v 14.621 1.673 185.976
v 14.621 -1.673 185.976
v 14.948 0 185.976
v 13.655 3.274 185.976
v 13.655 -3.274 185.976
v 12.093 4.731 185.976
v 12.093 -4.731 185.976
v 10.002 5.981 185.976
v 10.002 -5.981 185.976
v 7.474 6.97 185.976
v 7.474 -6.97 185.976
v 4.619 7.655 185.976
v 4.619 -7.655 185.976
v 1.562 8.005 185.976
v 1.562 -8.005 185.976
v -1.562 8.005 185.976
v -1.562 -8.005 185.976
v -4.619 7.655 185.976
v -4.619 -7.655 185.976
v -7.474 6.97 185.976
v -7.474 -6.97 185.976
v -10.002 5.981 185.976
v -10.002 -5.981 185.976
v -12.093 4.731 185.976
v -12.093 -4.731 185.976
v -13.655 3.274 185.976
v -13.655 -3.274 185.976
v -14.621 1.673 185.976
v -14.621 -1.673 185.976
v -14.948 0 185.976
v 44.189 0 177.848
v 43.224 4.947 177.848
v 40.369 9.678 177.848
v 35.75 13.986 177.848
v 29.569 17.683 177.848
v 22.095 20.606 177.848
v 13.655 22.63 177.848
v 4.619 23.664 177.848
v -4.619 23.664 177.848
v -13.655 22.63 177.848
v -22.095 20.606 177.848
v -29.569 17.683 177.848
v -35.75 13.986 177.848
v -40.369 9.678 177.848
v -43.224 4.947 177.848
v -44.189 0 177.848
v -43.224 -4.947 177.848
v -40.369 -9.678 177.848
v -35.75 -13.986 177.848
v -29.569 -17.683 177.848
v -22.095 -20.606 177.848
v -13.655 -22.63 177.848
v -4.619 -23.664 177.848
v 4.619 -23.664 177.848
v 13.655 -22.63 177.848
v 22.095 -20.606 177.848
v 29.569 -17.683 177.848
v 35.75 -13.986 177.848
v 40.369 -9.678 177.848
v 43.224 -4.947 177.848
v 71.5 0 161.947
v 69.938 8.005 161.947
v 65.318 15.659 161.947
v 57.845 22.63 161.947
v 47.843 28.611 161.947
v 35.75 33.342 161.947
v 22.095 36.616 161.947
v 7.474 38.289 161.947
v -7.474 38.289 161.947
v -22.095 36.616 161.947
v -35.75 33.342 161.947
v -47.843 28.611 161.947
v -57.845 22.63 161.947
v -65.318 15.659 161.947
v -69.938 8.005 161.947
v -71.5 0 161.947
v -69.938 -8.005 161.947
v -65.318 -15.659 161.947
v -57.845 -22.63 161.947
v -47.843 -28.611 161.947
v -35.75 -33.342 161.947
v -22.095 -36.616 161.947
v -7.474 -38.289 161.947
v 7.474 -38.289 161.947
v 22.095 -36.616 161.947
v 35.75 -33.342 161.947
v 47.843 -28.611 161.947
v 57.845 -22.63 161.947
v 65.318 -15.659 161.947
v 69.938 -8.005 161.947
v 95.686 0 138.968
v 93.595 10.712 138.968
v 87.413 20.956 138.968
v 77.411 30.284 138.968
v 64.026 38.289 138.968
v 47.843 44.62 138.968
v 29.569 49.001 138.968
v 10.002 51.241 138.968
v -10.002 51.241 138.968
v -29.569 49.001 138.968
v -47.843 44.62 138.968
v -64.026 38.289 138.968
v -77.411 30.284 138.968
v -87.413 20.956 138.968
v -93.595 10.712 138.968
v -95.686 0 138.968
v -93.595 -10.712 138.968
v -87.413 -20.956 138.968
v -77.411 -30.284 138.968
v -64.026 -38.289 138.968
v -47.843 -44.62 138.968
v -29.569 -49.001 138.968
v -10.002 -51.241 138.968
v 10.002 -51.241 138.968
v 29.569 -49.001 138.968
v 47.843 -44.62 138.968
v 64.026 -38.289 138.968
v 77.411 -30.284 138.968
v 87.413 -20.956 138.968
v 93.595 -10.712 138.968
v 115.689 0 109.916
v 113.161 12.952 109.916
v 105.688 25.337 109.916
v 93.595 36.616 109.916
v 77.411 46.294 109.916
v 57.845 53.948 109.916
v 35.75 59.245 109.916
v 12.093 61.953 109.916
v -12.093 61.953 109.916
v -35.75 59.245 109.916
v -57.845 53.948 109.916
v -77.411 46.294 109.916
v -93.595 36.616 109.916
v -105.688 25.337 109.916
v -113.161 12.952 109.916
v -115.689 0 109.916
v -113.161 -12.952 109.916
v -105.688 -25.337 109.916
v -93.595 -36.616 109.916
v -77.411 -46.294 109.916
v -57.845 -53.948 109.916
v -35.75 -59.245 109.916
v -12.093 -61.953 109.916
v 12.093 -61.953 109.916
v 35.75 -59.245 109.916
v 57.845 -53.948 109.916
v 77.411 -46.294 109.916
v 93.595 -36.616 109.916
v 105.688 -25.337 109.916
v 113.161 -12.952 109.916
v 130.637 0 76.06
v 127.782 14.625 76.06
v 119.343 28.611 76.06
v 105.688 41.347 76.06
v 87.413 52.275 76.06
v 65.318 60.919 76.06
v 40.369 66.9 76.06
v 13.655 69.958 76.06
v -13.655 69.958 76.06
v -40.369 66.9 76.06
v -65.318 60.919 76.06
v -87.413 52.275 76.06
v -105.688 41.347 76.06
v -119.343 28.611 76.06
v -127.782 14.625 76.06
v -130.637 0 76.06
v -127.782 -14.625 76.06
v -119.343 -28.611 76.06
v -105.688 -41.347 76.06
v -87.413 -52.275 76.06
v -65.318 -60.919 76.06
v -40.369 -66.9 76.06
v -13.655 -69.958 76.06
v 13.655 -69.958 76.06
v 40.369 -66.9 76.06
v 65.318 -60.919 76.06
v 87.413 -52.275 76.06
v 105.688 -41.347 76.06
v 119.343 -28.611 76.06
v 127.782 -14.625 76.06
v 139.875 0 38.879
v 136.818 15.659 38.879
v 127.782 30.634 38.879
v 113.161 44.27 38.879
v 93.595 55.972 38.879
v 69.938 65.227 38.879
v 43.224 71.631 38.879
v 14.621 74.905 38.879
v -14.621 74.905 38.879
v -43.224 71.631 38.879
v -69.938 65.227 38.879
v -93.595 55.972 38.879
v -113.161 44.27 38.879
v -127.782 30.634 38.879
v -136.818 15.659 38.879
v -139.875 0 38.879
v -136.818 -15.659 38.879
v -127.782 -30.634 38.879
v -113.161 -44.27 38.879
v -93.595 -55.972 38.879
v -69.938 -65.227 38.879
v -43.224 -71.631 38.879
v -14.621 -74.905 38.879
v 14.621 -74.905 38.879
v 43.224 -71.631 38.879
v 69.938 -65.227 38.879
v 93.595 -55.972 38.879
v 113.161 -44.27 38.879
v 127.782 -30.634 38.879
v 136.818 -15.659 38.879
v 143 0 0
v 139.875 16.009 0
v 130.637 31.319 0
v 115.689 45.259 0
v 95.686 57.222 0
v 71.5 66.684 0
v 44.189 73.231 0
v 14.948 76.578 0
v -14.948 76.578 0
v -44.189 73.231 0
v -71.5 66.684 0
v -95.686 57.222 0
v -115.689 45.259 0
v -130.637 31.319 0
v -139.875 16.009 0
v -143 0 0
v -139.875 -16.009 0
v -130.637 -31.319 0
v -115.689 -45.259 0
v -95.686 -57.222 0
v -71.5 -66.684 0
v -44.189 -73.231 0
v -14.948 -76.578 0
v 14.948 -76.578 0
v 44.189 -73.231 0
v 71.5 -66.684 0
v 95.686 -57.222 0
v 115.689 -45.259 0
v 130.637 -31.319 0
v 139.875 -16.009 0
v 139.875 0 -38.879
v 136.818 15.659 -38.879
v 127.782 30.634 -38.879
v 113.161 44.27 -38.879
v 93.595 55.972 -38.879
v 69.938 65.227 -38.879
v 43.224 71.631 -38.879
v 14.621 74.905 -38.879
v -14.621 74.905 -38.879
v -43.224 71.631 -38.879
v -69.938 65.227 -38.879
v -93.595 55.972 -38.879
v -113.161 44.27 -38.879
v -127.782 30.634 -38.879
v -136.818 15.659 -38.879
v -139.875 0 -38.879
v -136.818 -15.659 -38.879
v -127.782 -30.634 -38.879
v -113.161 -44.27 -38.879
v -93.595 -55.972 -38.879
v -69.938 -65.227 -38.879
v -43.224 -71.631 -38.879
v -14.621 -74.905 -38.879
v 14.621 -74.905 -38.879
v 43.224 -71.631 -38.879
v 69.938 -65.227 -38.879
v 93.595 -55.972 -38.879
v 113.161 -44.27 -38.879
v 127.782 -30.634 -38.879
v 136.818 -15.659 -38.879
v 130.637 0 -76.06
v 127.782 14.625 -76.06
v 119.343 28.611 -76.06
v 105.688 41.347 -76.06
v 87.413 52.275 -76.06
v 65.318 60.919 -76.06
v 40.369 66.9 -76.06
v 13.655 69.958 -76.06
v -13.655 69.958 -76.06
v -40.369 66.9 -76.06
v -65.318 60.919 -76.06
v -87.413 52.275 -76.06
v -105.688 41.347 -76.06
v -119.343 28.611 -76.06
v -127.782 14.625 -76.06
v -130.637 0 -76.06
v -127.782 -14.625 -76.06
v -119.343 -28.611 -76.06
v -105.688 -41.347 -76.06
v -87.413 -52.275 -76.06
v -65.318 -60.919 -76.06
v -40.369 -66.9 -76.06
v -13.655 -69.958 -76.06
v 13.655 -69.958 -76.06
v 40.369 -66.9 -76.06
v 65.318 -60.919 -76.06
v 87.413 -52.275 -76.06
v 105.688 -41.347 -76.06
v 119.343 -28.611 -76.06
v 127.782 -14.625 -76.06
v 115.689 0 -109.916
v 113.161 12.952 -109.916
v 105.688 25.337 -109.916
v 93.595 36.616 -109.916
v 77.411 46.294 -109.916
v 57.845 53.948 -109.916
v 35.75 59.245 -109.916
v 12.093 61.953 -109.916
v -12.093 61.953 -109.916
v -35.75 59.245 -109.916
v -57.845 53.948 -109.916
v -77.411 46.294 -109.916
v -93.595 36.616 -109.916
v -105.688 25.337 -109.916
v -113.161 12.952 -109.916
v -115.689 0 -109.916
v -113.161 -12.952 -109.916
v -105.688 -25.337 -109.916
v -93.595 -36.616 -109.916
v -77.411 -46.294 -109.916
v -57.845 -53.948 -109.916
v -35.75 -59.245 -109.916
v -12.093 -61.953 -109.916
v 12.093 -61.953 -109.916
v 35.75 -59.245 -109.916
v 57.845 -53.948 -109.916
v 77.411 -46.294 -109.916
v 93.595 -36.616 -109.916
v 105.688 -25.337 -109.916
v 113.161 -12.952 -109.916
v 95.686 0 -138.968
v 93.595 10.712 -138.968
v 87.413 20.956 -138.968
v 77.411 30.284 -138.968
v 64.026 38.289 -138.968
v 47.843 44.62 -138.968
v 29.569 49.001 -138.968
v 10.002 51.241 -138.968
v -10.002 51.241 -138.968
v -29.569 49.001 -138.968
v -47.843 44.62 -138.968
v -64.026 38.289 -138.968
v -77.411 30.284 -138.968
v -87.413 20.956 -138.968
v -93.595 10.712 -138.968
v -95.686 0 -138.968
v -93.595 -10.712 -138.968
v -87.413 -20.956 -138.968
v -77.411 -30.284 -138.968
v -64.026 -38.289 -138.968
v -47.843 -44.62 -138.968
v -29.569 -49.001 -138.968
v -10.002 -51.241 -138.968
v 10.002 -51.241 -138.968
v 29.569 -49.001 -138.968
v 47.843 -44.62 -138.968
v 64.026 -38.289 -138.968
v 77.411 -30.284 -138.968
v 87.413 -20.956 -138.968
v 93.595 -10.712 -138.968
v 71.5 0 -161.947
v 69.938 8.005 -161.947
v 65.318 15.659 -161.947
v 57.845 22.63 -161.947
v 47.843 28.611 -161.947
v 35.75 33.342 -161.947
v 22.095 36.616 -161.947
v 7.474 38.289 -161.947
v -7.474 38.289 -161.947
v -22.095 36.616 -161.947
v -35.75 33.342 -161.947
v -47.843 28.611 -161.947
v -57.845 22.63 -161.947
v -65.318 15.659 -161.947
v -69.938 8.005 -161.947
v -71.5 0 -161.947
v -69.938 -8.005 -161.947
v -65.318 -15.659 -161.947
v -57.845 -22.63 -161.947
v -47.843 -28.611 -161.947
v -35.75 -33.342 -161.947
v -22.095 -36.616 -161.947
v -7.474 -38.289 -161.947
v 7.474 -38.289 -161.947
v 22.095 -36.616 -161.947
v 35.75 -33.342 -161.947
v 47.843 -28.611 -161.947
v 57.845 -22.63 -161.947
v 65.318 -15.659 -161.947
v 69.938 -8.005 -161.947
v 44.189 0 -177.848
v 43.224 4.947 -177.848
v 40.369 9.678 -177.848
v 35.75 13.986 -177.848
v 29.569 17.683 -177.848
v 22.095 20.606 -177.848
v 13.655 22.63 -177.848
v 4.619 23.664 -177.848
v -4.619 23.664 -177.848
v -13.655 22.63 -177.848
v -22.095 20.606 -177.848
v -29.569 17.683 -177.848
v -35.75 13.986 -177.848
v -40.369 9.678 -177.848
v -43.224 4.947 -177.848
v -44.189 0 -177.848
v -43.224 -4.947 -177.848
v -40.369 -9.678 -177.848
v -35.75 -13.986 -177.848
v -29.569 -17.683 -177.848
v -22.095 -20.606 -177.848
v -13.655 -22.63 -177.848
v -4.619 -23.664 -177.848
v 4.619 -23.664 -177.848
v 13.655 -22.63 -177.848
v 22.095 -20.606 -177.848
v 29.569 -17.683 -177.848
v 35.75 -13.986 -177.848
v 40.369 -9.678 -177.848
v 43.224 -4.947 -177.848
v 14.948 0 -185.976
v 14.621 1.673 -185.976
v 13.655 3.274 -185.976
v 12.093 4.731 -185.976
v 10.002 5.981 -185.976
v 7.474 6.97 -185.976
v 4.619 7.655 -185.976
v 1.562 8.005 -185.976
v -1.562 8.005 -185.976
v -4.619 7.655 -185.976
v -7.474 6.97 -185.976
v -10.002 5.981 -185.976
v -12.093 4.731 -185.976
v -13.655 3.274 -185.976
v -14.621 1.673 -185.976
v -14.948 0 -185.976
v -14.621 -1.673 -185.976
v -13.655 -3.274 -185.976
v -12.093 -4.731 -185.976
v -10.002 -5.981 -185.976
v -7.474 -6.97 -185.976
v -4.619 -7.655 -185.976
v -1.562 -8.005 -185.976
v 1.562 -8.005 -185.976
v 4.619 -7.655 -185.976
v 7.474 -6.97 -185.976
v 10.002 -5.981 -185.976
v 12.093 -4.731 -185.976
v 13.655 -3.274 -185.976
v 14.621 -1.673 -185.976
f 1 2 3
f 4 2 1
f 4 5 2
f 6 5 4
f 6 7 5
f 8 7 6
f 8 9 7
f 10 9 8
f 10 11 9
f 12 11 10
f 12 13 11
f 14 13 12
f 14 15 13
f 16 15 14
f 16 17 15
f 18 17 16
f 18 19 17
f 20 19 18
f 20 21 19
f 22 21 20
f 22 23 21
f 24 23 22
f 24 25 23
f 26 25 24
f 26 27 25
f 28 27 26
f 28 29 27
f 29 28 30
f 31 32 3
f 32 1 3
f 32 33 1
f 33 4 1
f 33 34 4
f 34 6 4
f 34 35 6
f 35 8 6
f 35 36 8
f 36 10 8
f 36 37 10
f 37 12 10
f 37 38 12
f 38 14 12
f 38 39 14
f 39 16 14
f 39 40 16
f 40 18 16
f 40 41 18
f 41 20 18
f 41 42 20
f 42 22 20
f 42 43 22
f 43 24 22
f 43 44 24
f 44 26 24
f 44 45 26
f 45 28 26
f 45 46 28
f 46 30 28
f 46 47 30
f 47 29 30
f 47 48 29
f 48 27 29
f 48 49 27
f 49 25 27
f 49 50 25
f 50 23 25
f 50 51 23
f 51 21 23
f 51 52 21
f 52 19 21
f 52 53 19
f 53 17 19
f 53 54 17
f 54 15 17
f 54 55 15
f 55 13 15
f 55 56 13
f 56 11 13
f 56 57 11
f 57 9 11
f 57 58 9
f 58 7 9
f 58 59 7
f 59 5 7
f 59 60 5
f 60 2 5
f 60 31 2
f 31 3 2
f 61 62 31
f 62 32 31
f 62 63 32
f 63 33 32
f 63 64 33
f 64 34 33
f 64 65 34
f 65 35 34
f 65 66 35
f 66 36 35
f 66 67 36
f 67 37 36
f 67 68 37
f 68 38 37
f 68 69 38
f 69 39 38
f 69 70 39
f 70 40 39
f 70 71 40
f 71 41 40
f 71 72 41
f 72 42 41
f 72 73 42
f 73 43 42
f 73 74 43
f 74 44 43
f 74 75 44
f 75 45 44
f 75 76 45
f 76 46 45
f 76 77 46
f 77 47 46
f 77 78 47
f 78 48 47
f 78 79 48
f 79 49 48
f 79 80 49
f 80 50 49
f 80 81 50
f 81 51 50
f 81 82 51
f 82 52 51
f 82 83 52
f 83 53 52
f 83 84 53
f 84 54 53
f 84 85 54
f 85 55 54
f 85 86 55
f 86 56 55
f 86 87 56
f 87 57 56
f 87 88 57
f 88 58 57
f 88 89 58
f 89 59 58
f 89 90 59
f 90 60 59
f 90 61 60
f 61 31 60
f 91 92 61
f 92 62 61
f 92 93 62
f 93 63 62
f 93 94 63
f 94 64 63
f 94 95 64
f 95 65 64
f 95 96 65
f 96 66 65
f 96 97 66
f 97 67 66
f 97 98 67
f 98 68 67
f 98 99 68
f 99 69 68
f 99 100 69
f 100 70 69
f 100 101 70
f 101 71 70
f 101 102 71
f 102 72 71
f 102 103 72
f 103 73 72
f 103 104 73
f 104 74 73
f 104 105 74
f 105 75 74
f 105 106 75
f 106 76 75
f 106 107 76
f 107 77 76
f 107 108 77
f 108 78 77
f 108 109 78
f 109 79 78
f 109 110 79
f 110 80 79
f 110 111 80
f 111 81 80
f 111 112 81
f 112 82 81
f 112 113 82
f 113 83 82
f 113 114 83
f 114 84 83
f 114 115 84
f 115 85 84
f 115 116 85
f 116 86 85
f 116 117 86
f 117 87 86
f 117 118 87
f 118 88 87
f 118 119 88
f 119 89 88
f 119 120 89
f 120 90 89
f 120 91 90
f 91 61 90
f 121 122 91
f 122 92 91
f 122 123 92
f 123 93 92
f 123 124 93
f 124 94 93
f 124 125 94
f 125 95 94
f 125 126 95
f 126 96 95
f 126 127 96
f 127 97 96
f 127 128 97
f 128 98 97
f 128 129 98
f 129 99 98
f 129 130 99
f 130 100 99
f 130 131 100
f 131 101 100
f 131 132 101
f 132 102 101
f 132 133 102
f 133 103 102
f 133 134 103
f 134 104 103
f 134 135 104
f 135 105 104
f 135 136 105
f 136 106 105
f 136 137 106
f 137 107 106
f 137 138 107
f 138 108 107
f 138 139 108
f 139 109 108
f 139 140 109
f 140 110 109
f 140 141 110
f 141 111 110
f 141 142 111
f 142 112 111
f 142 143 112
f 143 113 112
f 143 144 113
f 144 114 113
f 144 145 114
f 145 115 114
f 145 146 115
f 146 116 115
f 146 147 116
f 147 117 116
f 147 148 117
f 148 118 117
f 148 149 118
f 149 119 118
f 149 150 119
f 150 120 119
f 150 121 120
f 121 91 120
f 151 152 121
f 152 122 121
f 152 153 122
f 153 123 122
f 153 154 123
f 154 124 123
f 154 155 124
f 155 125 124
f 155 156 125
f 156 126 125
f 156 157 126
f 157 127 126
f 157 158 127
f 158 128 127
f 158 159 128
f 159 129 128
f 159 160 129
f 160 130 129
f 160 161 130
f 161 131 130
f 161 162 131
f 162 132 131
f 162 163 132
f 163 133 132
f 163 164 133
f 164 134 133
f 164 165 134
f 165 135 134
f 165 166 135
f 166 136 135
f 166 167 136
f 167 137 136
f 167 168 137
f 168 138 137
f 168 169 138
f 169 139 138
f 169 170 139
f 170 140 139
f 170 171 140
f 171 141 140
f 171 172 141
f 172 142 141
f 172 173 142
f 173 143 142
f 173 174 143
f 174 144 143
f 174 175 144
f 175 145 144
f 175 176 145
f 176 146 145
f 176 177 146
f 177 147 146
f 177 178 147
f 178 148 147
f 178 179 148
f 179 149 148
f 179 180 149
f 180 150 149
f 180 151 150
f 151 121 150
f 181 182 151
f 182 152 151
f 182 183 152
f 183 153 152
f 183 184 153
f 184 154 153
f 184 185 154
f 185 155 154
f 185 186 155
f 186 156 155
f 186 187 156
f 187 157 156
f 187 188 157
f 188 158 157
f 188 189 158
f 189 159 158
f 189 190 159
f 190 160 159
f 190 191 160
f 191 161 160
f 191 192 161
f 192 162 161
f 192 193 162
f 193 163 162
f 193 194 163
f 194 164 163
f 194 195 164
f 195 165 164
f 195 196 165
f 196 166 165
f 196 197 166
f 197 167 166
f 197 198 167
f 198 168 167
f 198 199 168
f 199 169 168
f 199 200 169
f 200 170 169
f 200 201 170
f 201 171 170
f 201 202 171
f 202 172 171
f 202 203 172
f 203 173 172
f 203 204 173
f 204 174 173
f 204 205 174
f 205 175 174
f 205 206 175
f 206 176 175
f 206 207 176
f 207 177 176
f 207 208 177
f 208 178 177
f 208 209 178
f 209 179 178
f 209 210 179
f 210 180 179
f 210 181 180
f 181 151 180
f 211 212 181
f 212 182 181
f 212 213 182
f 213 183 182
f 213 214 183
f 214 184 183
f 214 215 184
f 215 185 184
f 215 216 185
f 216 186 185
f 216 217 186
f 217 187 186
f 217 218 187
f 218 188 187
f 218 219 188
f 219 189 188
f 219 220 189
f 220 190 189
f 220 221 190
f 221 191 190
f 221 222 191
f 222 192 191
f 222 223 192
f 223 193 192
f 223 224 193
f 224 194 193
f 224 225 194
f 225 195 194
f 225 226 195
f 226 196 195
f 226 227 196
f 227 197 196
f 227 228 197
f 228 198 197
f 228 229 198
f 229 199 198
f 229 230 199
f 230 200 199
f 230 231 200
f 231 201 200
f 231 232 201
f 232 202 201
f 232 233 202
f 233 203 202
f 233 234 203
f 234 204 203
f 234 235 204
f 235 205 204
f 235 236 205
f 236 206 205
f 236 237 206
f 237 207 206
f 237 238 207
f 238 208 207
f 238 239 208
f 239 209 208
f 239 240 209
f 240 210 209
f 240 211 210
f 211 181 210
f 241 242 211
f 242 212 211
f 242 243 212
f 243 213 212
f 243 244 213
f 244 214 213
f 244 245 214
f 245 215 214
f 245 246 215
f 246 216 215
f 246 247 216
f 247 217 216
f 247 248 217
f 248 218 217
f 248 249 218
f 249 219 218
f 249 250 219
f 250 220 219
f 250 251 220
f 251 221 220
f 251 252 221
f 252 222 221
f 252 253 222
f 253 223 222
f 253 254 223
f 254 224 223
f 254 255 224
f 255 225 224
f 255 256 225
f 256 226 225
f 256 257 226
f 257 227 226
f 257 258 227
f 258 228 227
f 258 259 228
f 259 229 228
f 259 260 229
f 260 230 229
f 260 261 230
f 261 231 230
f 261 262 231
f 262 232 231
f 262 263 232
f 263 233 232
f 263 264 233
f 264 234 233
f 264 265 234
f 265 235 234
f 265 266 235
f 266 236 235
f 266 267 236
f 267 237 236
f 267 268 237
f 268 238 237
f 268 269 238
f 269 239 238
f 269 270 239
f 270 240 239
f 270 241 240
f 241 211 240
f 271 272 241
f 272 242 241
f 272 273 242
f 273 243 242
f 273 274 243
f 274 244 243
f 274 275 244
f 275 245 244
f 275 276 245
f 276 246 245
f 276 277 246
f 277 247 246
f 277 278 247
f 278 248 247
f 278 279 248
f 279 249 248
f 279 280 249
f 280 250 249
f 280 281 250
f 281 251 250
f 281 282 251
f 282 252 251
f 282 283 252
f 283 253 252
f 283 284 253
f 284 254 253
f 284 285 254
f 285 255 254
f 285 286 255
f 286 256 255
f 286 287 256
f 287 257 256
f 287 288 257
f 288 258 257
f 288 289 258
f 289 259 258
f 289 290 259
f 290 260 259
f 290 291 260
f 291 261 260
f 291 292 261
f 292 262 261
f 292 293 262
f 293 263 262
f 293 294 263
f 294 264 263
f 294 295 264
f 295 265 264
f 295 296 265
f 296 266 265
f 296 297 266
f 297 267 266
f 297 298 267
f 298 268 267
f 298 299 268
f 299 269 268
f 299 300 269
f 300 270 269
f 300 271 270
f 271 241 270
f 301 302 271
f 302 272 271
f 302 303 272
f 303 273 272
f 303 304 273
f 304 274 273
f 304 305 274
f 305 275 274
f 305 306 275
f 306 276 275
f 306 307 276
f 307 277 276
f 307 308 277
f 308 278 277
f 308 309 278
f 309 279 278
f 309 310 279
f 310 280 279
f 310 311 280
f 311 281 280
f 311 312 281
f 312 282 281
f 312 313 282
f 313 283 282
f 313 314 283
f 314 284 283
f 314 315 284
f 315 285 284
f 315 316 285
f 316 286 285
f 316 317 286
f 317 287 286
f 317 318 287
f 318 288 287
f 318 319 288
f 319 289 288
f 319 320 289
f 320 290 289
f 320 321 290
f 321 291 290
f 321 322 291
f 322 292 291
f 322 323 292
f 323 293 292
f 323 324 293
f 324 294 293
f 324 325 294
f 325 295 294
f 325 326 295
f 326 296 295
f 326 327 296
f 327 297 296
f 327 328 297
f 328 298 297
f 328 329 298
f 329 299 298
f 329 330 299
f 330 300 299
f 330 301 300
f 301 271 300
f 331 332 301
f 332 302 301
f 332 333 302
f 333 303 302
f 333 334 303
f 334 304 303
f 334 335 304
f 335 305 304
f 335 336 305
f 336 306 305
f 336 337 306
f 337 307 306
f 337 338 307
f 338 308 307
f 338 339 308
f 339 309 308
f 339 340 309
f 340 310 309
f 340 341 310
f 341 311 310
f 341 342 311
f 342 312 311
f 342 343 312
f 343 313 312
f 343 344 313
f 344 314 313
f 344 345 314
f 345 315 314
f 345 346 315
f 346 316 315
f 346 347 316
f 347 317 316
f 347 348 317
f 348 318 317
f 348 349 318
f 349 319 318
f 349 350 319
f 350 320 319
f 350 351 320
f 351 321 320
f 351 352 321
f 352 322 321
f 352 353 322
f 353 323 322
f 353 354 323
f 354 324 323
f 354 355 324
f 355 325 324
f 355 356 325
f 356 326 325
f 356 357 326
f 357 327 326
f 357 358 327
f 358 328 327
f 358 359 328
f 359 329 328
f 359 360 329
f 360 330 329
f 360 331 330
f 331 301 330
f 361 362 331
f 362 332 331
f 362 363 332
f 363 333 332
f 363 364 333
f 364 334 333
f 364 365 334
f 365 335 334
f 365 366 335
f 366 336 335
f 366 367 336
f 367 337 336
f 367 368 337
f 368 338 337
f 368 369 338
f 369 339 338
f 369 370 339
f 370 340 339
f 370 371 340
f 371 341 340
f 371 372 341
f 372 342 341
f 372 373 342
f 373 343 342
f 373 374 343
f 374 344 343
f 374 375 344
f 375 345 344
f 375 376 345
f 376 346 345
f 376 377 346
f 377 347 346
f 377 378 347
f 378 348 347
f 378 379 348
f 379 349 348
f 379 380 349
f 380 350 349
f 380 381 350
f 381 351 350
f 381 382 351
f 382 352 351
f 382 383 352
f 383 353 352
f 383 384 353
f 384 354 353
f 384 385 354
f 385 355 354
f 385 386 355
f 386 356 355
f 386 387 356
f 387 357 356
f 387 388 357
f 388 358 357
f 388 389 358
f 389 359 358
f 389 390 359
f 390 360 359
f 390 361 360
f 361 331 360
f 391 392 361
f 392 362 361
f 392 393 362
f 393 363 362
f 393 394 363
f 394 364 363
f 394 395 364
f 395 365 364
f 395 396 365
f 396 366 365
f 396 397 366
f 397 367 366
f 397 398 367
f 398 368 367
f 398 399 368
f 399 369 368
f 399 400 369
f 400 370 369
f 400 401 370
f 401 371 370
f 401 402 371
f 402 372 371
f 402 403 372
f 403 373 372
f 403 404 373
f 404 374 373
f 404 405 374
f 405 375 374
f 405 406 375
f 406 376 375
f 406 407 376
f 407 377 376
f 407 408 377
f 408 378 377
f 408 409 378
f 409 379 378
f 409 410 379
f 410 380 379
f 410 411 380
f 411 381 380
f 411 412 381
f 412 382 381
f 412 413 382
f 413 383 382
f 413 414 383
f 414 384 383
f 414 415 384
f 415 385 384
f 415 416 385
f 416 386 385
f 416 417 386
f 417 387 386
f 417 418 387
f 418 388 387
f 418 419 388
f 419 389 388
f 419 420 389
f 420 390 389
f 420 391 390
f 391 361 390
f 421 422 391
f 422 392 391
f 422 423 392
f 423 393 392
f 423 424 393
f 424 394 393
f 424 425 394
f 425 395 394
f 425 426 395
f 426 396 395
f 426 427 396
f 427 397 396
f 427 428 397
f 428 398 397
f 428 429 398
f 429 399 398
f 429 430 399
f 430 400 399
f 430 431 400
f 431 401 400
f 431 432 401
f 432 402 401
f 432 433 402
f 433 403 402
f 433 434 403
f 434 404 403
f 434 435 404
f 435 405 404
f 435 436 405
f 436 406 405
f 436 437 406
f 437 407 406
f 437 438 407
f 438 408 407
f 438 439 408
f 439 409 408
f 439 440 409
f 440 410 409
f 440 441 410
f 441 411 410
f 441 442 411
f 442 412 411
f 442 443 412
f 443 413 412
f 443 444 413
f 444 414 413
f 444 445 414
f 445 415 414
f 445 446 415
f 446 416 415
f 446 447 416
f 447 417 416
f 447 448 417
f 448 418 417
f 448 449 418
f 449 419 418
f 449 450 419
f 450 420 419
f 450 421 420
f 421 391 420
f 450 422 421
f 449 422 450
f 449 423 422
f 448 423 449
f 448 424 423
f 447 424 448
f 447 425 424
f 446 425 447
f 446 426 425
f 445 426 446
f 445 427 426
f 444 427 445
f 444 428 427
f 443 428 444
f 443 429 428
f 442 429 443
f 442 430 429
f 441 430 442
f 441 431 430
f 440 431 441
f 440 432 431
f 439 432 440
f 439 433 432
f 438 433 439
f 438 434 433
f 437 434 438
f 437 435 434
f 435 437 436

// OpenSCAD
// Generated by SolidPython 1.0.1 on 2020-07-29 00:46:50


scale(v = [13, 7, 17]) {
	sphere(r = 11);
}
/***********************************************
*********      SolidPython code:      **********
************************************************
 
# import packages: SolidPython
from solid import *
from solid.utils import *
from itertools import chain, combinations, permutations


class Resize:

    def __init__(self, scad_file):
        self.scad_file = scad_file
        #self.scad_file = import_scad(scad_file)
        # cone/cylinder param:
        self.r1 = 0
        self.r2 = 0
        self.h = 0
        # rectangular prism param:
        self.w = 0
        self.l = 0
        # ellipse param:
        self.r = 0

    # import OpenScad code (file name corresponds to shape)


    # classify shape + parameters
    def assign(self, param1, param2, param3):
        if self.scad_file == 'cone.scad':
            self.r1 = param1
            self.r2 = param2
            self.h = param3
        elif self.scad_file == 'cylinder.scad':
            self.r1 = param1
            self.r2 = param2
            self.h = param3
        elif self.scad_file == 'rectangularPrism.scad':
            self.h = param1
            self.l = param2
            self.w = param3
        else:
            self.r = param1
            self.h = param2

    # resize parameters
    def iterate(self):
        x = range(3, 20, 2)
        i = 1
        if self.scad_file == 'cone.scad':
            tempList = list(permutations(x, 2))
            for temp in tempList:
                param1 = temp[0]
                param2 = temp[1]
                filepath = 'produced_scad_files/' + 'cone' + str(param1) + '_' + str(param2) + '_' + '.scad'
                scad_render_to_file(cylinder(h=param1, r1=param2, r2=0), filepath)

        elif self.scad_file == 'cylinder.scad':
            tempList = list(permutations(x, 3))
            for temp in tempList:
                param1 = temp[0]
                param2 = temp[1]
                filepath = 'produced_scad_files/' + 'cylinder' + str(param1) + '_' + str(param2) + '_' + '.scad'
                scad_render_to_file(cylinder(h=param1, r1=param2, r2=param2), filepath)

        elif self.scad_file == 'rectangularPrism.scad':
            tempList = list(permutations(x, 3))
            for temp in tempList:
                param1 = temp[0]
                param2 = temp[1]
                param3 = temp[2]
                filepath = 'produced_scad_files/' + 'rectangularPrism' + str(param1) + '_' + str(param2) + '_' + str(
                    param3) + '.scad'
                scad_render_to_file(cube(size=(param1, param2, param3)), filepath)

        elif self.scad_file == 'ellipse.scad':
            tempList = list(permutations(x, 4))
            for temp in tempList:
                param1 = temp[0]
                param2 = temp[1]
                param3 = temp[2]
                param4 = temp[3]
                filepath = 'produced_scad_files/' + 'ellipse' + str(param1) + '_' + str(param2) + '_' + str(param3) + '_' + str(param4) + '.scad'
                scad_render_to_file(scale([param1, param2, param3])(sphere(r=param4)), filepath)

    def render_to_scadfile(self):
        scad_render_to_file(scad, 'example.scad') 
 
************************************************/
